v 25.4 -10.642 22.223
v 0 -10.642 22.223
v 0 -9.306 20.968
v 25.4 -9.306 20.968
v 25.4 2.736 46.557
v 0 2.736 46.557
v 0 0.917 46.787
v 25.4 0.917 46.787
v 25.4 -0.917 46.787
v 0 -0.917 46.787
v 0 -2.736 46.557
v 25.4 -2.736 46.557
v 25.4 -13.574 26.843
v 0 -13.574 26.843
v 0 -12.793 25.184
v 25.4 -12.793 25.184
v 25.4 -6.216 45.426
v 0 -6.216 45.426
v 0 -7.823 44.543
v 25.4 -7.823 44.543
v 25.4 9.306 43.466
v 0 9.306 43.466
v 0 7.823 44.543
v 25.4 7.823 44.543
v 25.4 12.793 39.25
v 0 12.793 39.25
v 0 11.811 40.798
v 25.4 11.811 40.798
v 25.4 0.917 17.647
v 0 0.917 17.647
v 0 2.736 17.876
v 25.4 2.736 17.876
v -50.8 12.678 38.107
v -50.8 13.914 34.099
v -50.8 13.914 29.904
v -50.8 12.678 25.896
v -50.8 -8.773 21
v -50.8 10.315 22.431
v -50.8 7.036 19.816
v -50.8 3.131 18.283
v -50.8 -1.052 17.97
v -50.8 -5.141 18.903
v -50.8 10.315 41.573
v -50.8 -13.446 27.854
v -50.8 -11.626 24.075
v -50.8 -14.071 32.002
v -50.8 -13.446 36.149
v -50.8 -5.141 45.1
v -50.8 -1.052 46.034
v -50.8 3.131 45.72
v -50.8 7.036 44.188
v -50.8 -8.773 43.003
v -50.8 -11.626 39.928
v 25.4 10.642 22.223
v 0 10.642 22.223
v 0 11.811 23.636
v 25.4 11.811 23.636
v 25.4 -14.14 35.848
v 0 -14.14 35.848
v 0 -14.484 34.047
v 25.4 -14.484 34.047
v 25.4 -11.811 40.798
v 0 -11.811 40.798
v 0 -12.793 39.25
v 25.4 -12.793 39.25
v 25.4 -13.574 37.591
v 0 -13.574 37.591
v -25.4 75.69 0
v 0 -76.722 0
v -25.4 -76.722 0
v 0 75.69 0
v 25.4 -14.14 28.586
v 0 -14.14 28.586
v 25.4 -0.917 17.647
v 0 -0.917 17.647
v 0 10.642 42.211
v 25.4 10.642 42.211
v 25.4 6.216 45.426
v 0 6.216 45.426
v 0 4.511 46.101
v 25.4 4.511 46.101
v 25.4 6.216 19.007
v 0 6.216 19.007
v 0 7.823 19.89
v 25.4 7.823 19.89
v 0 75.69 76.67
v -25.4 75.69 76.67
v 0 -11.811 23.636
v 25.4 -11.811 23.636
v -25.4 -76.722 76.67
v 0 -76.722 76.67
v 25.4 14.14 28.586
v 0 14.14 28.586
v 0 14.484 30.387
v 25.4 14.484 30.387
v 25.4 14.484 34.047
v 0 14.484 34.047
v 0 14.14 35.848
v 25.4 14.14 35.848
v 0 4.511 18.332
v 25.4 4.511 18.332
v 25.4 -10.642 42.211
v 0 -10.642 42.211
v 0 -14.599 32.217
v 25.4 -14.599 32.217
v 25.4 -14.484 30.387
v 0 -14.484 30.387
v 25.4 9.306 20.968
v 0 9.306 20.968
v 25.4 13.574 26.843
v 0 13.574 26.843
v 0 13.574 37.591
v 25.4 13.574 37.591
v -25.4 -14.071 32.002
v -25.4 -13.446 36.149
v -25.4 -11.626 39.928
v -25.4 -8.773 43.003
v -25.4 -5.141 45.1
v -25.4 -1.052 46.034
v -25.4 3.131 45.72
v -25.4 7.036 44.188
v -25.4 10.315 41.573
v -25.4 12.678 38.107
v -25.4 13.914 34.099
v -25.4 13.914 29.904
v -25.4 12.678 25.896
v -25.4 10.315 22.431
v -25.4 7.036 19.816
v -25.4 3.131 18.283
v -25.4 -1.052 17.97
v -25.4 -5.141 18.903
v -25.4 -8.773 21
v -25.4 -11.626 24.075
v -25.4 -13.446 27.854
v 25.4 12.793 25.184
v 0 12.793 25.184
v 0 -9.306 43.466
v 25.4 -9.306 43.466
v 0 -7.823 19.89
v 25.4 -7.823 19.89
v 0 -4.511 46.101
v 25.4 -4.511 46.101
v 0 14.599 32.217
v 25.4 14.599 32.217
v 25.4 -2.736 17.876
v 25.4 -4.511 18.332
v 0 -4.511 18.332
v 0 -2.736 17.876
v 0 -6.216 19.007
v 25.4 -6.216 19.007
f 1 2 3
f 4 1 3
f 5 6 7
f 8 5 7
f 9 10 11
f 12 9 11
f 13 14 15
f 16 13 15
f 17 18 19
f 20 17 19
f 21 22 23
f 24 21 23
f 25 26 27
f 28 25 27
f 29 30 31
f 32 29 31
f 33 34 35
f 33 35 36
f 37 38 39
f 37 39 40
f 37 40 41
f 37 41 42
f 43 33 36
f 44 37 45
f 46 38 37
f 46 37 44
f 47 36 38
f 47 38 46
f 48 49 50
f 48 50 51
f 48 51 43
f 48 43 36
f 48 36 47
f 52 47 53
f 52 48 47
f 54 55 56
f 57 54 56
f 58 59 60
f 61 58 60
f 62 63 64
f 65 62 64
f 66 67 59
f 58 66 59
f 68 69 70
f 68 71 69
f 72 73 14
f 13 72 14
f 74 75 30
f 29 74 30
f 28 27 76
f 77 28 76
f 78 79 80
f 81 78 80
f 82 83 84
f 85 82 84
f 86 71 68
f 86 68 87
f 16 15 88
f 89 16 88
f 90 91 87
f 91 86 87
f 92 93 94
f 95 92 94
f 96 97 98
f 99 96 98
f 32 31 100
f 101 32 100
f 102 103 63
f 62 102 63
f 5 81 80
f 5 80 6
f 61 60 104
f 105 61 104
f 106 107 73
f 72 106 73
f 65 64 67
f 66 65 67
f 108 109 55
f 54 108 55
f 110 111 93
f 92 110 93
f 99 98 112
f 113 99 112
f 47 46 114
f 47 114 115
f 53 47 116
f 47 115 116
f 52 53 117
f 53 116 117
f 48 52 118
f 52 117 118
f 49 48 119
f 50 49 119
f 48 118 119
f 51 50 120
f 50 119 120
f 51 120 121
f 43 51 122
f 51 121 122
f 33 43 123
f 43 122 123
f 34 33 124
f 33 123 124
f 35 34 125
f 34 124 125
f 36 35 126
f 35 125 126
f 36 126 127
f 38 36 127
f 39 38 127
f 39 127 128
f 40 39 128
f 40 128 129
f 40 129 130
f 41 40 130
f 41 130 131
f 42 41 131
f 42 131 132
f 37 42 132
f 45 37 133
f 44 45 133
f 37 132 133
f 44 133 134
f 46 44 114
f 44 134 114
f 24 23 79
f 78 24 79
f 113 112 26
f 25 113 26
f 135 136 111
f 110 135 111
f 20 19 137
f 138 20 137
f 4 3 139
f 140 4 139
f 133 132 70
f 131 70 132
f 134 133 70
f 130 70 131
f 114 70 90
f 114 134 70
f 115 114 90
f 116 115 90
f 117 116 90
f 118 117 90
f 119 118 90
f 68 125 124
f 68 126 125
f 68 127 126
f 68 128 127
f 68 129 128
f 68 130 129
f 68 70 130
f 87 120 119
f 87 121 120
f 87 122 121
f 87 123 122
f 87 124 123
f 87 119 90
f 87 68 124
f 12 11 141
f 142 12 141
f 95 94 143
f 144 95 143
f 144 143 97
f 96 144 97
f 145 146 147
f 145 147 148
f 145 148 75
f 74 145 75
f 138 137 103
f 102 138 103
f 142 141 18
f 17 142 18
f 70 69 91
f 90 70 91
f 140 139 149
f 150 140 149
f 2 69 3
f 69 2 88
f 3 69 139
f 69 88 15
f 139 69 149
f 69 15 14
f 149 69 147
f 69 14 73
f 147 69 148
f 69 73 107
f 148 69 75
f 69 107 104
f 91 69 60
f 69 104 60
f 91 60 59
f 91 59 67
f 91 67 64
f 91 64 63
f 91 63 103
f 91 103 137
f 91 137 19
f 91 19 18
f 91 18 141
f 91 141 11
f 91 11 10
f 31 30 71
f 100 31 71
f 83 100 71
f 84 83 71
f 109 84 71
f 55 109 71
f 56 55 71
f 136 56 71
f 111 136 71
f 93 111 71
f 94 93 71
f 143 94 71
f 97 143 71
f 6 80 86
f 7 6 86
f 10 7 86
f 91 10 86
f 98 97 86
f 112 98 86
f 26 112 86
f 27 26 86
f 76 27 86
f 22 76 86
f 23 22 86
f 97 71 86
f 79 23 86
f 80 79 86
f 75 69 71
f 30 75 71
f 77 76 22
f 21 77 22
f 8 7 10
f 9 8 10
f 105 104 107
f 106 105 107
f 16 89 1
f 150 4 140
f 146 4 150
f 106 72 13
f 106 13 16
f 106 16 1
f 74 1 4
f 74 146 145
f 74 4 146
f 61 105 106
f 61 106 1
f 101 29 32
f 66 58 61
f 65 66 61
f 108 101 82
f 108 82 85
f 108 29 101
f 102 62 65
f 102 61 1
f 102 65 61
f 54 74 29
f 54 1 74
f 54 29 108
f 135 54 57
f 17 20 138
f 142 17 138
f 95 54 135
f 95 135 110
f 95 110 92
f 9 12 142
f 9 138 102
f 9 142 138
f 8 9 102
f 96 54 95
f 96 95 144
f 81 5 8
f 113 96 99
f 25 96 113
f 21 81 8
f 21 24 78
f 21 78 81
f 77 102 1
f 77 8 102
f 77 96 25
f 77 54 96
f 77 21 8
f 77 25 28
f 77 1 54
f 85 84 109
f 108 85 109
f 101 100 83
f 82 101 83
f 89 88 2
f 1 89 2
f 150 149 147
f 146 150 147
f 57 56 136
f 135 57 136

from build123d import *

# Parameters (mm, degrees)
F0_W     = 83.83190725
F0_H     = 76.6697376966
F1_DEPTH = 25.4
F3_DEPTH = 68.58
F6_DEPTH = 25.4
F7_R     = 14.0713154884
F8_DEPTH = 25.4


with BuildPart() as f1:
    # F0 (on Right) → F1 (new body)
    with BuildSketch(Plane.YZ):
        with Locations((33.7740029208, 38.3348688483)):
            Rectangle(F0_W, F0_H)
    extrude(amount=-F1_DEPTH)

    # F3 (add): a face of the model
    f3_faces = [f1.faces().sort_by_distance(p)[0] for p in [
        (-12.7, -8.1419507042, 38.3348688483),
    ]]
    extrude(f3_faces, amount=F3_DEPTH)

    # F5 (on face) → F6 (join)
    with BuildSketch(Plane.YZ):
        Polygon((2.735585974, 46.5573131723), (0.9166808596, 46.7870943248), (-0.9166808596, 46.7870943248), (-2.735585974, 46.5573131723), (-4.5113492634, 46.1013746532), (-6.2159658801, 45.4264691904), (-7.8225530015, 44.5432404463), (-9.3057737891, 43.4656174656), (-10.6422369651, 42.2105950066), (-11.8108657068, 40.7979655232), (-12.7932300408, 39.2500070262), (-13.5738374948, 37.5911317457), (-14.1403774229, 35.847501136), (-14.4839151519, 34.0466132933), (-14.5990328868, 32.2168692946), (-14.4839151519, 30.387125296), (-14.1403774229, 28.5862374533), (-13.5738374948, 26.8426068436), (-12.7932300408, 25.1837315631), (-11.8108657068, 23.6357730661), (-10.6422369651, 22.2231435827), (-9.3057737891, 20.9681211237), (-7.8225530015, 19.890498143), (-6.2159658801, 19.0072693989), (-4.5113492634, 18.3323639361), (-2.735585974, 17.876425417), (-0.9166808596, 17.6466442645), (0.9166808596, 17.6466442645), (2.735585974, 17.876425417), (4.5113492634, 18.3323639361), (6.2159658801, 19.0072693989), (7.8225530015, 19.890498143), (9.3057737891, 20.9681211237), (10.6422369651, 22.2231435827), (11.8108657068, 23.6357730661), (12.7932300408, 25.1837315631), (13.5738374948, 26.8426068436), (14.1403774229, 28.5862374533), (14.4839151519, 30.387125296), (14.5990328868, 32.2168692946), (14.4839151519, 34.0466132933), (14.1403774229, 35.847501136), (13.5738374948, 37.5911317457), (12.7932300408, 39.2500070262), (11.8108657068, 40.7979655232), (10.6422369651, 42.2105950066), (9.3057737891, 43.4656174656), (7.8225530015, 44.5432404463), (6.2159658801, 45.4264691904), (4.5113492634, 46.1013746532), align=None)
    extrude(amount=F6_DEPTH)

    # F7 (on face) → F8 (join)
    with BuildSketch(Plane(origin=(-25.4, 0, 0), x_dir=(0, -1, 0), z_dir=(-1, 0, 0))):
        with Locations((0, 32.0016257465)):
            Circle(F7_R)
    extrude(amount=F8_DEPTH)


solid = f1.part
